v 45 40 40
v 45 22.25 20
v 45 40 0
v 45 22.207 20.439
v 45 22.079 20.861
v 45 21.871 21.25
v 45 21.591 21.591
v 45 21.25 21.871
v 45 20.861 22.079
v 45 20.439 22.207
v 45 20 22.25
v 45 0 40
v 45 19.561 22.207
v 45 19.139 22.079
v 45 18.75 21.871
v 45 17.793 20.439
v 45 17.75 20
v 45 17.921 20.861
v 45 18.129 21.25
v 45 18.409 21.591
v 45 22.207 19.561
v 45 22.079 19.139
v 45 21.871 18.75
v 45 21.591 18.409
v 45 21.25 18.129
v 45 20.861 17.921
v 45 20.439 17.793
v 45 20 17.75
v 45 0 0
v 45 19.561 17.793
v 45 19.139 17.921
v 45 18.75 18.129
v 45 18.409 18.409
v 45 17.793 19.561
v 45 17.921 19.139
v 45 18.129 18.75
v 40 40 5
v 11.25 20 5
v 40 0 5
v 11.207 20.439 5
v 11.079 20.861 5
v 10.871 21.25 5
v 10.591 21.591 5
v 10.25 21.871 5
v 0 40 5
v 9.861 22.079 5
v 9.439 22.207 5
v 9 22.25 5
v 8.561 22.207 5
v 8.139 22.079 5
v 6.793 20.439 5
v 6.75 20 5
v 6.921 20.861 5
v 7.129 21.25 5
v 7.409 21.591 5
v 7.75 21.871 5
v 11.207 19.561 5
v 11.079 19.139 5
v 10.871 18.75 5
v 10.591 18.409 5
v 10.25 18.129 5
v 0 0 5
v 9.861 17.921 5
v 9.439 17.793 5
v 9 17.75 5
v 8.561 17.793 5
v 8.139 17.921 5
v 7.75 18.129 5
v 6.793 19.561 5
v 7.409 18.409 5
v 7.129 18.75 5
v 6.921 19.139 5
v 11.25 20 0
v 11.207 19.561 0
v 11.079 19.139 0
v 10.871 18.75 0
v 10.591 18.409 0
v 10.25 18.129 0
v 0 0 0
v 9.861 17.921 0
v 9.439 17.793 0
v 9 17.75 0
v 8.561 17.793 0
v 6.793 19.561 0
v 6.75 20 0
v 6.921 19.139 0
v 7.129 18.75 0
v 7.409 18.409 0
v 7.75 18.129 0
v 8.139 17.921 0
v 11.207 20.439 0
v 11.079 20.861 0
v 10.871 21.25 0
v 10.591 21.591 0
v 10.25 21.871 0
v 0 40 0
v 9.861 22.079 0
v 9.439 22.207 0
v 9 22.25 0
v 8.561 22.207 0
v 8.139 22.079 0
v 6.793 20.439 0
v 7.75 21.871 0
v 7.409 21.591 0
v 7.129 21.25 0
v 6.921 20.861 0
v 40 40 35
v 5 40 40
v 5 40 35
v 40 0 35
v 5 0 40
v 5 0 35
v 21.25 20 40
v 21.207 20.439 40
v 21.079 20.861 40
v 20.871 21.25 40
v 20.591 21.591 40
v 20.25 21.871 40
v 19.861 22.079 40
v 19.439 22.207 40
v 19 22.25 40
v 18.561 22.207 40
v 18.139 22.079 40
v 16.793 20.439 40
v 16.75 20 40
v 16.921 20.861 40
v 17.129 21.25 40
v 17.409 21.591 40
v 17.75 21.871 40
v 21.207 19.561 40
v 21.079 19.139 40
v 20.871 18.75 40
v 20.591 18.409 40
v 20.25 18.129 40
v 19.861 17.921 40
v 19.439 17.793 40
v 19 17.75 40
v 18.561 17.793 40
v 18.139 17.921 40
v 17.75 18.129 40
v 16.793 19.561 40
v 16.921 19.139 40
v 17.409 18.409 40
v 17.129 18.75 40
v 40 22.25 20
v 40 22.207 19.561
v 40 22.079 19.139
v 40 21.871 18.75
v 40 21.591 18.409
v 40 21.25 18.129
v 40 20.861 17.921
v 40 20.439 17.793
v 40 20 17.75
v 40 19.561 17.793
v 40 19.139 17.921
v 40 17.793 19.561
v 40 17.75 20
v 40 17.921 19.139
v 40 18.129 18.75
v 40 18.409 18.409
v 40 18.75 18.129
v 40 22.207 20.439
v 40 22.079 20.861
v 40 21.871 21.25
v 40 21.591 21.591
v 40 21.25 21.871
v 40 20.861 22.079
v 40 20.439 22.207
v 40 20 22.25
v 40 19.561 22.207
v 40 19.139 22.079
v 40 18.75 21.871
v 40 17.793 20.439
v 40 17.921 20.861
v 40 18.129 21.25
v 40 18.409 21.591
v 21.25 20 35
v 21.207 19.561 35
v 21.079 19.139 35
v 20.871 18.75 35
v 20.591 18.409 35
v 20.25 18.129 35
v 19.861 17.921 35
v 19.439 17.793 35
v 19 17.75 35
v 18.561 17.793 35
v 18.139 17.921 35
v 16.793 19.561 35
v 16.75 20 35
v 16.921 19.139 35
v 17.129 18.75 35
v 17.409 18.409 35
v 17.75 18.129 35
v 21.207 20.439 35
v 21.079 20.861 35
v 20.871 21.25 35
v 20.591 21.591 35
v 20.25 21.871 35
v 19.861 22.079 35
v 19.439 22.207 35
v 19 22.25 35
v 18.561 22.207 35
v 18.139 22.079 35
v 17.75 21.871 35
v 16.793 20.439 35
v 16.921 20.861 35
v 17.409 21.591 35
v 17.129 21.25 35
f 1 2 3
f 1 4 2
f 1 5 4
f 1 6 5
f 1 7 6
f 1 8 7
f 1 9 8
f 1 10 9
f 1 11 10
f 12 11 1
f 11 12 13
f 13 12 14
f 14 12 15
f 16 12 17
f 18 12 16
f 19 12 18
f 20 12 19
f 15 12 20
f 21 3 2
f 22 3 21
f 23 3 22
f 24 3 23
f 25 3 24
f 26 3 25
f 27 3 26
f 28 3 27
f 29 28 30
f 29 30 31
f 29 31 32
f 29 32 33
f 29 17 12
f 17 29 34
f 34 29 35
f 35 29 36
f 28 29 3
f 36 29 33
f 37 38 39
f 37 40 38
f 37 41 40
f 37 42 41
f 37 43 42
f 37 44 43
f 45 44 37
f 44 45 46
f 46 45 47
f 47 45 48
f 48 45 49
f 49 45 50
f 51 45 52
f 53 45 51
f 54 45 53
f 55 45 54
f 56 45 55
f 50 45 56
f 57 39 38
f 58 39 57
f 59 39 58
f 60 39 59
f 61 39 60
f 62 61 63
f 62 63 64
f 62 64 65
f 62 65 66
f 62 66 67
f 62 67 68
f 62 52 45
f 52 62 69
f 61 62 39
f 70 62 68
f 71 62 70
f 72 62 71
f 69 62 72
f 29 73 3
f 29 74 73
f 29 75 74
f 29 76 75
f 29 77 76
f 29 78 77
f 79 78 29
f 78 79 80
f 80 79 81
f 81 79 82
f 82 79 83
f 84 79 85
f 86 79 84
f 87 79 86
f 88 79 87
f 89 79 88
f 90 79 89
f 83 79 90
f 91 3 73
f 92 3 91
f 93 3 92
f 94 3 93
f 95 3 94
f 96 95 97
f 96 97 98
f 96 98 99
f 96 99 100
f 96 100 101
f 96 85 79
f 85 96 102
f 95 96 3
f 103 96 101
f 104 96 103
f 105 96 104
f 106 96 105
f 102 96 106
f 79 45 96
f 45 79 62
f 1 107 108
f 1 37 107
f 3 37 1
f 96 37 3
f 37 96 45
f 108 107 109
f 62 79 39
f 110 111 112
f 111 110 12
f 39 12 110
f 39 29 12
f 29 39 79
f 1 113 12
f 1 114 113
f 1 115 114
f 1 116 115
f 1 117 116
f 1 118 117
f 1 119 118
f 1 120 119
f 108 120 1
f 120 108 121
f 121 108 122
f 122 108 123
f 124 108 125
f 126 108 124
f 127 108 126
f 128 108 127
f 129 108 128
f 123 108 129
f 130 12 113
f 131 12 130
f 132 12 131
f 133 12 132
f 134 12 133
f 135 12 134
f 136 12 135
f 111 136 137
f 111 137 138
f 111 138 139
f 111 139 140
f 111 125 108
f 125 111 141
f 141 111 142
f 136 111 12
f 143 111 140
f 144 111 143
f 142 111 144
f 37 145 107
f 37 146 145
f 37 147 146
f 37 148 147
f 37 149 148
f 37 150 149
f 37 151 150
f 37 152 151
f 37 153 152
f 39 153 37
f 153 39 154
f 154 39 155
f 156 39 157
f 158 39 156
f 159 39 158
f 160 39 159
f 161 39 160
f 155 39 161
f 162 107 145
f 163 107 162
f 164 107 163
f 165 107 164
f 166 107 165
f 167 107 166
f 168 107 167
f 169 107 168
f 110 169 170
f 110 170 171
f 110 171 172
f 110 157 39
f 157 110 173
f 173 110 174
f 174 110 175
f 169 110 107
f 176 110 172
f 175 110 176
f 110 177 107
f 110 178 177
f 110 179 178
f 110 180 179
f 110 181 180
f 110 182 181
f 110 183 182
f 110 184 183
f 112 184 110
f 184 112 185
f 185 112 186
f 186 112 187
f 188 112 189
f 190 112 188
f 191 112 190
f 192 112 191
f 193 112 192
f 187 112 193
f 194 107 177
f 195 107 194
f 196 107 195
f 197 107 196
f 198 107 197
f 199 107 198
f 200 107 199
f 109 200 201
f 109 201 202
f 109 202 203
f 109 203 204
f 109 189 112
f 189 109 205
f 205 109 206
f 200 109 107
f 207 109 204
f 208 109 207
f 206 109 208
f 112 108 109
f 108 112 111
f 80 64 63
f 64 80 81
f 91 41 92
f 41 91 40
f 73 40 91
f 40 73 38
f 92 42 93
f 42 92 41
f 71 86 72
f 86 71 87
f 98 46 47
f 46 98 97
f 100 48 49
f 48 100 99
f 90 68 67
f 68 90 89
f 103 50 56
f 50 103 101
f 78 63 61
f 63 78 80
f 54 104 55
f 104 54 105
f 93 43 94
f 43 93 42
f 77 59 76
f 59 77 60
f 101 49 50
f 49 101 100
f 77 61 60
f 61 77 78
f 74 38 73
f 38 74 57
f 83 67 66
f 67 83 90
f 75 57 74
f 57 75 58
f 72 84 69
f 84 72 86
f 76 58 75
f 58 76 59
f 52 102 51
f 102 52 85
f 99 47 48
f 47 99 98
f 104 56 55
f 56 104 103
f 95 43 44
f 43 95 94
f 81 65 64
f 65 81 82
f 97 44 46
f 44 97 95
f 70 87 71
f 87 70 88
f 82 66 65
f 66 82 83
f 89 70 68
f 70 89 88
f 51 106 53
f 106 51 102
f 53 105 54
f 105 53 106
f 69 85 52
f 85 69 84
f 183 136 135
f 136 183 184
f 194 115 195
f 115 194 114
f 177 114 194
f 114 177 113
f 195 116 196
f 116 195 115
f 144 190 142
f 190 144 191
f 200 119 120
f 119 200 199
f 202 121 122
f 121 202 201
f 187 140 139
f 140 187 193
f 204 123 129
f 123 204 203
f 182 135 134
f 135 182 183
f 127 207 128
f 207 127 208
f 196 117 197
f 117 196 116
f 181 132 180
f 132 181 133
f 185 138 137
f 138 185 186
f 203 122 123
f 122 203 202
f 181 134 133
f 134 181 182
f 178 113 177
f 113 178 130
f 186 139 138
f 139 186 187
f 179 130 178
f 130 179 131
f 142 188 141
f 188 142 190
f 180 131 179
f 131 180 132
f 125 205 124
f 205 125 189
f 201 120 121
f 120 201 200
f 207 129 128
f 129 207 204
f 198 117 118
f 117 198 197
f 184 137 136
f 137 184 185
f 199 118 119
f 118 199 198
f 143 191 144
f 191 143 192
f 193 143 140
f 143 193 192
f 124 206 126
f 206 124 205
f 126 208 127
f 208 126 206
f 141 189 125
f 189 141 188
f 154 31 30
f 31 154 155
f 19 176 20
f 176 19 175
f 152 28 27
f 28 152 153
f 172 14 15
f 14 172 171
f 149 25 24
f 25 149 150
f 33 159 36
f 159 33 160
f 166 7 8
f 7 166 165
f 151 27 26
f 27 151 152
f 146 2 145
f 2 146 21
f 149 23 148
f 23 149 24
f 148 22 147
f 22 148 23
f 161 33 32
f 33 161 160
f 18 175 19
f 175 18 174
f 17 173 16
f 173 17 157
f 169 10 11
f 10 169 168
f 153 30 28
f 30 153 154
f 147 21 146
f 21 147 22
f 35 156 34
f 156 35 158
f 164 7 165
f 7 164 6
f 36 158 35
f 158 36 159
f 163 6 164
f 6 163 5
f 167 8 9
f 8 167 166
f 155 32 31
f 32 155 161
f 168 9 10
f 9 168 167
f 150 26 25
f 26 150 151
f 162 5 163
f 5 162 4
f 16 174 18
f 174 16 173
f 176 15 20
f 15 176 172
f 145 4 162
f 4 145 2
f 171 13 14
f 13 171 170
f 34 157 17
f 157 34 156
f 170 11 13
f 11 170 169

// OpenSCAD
$fn = 32;

// ----------------------------------------------------------------------
// Z-bracket: 45 x 40 x 40 mm
// ----------------------------------------------------------------------

// --- parameters (mm) ---
lower_len = 45;           // lower foot length, X
upper_len = 35;           // upper foot length, X
width = 40;               // bracket width, Y
rise = 40;                // overall rise, Z
thick = 5;                // plate thickness
hole_d = 4.5;             // clearance for M4

module hole_z(px, py, z0) {
  translate([px, py, z0 - 2.5]) cylinder(h = thick + 5, d = hole_d);
}
module hole_x(py, pz) {
  translate([-2.5, py, pz]) rotate([0, 90, 0]) cylinder(h = thick + 5, d = hole_d);
}

difference() {
  union() {
    cube([lower_len, width, thick]);
    /* web, overlapping the lower foot */
    translate([lower_len - thick, 0, 0]) cube([thick, width, rise]);
    /* upper foot, sunk into the web */
    translate([lower_len - thick - upper_len, 0, rise - thick]) cube([upper_len + thick, width, thick]);
  }
  hole_z(9, 20, 0);
  translate([lower_len - thick - 21, 0, 0]) hole_z(0, 20, rise - thick);
  translate([lower_len - thick, 0, 0]) hole_x(20, 20);
}
